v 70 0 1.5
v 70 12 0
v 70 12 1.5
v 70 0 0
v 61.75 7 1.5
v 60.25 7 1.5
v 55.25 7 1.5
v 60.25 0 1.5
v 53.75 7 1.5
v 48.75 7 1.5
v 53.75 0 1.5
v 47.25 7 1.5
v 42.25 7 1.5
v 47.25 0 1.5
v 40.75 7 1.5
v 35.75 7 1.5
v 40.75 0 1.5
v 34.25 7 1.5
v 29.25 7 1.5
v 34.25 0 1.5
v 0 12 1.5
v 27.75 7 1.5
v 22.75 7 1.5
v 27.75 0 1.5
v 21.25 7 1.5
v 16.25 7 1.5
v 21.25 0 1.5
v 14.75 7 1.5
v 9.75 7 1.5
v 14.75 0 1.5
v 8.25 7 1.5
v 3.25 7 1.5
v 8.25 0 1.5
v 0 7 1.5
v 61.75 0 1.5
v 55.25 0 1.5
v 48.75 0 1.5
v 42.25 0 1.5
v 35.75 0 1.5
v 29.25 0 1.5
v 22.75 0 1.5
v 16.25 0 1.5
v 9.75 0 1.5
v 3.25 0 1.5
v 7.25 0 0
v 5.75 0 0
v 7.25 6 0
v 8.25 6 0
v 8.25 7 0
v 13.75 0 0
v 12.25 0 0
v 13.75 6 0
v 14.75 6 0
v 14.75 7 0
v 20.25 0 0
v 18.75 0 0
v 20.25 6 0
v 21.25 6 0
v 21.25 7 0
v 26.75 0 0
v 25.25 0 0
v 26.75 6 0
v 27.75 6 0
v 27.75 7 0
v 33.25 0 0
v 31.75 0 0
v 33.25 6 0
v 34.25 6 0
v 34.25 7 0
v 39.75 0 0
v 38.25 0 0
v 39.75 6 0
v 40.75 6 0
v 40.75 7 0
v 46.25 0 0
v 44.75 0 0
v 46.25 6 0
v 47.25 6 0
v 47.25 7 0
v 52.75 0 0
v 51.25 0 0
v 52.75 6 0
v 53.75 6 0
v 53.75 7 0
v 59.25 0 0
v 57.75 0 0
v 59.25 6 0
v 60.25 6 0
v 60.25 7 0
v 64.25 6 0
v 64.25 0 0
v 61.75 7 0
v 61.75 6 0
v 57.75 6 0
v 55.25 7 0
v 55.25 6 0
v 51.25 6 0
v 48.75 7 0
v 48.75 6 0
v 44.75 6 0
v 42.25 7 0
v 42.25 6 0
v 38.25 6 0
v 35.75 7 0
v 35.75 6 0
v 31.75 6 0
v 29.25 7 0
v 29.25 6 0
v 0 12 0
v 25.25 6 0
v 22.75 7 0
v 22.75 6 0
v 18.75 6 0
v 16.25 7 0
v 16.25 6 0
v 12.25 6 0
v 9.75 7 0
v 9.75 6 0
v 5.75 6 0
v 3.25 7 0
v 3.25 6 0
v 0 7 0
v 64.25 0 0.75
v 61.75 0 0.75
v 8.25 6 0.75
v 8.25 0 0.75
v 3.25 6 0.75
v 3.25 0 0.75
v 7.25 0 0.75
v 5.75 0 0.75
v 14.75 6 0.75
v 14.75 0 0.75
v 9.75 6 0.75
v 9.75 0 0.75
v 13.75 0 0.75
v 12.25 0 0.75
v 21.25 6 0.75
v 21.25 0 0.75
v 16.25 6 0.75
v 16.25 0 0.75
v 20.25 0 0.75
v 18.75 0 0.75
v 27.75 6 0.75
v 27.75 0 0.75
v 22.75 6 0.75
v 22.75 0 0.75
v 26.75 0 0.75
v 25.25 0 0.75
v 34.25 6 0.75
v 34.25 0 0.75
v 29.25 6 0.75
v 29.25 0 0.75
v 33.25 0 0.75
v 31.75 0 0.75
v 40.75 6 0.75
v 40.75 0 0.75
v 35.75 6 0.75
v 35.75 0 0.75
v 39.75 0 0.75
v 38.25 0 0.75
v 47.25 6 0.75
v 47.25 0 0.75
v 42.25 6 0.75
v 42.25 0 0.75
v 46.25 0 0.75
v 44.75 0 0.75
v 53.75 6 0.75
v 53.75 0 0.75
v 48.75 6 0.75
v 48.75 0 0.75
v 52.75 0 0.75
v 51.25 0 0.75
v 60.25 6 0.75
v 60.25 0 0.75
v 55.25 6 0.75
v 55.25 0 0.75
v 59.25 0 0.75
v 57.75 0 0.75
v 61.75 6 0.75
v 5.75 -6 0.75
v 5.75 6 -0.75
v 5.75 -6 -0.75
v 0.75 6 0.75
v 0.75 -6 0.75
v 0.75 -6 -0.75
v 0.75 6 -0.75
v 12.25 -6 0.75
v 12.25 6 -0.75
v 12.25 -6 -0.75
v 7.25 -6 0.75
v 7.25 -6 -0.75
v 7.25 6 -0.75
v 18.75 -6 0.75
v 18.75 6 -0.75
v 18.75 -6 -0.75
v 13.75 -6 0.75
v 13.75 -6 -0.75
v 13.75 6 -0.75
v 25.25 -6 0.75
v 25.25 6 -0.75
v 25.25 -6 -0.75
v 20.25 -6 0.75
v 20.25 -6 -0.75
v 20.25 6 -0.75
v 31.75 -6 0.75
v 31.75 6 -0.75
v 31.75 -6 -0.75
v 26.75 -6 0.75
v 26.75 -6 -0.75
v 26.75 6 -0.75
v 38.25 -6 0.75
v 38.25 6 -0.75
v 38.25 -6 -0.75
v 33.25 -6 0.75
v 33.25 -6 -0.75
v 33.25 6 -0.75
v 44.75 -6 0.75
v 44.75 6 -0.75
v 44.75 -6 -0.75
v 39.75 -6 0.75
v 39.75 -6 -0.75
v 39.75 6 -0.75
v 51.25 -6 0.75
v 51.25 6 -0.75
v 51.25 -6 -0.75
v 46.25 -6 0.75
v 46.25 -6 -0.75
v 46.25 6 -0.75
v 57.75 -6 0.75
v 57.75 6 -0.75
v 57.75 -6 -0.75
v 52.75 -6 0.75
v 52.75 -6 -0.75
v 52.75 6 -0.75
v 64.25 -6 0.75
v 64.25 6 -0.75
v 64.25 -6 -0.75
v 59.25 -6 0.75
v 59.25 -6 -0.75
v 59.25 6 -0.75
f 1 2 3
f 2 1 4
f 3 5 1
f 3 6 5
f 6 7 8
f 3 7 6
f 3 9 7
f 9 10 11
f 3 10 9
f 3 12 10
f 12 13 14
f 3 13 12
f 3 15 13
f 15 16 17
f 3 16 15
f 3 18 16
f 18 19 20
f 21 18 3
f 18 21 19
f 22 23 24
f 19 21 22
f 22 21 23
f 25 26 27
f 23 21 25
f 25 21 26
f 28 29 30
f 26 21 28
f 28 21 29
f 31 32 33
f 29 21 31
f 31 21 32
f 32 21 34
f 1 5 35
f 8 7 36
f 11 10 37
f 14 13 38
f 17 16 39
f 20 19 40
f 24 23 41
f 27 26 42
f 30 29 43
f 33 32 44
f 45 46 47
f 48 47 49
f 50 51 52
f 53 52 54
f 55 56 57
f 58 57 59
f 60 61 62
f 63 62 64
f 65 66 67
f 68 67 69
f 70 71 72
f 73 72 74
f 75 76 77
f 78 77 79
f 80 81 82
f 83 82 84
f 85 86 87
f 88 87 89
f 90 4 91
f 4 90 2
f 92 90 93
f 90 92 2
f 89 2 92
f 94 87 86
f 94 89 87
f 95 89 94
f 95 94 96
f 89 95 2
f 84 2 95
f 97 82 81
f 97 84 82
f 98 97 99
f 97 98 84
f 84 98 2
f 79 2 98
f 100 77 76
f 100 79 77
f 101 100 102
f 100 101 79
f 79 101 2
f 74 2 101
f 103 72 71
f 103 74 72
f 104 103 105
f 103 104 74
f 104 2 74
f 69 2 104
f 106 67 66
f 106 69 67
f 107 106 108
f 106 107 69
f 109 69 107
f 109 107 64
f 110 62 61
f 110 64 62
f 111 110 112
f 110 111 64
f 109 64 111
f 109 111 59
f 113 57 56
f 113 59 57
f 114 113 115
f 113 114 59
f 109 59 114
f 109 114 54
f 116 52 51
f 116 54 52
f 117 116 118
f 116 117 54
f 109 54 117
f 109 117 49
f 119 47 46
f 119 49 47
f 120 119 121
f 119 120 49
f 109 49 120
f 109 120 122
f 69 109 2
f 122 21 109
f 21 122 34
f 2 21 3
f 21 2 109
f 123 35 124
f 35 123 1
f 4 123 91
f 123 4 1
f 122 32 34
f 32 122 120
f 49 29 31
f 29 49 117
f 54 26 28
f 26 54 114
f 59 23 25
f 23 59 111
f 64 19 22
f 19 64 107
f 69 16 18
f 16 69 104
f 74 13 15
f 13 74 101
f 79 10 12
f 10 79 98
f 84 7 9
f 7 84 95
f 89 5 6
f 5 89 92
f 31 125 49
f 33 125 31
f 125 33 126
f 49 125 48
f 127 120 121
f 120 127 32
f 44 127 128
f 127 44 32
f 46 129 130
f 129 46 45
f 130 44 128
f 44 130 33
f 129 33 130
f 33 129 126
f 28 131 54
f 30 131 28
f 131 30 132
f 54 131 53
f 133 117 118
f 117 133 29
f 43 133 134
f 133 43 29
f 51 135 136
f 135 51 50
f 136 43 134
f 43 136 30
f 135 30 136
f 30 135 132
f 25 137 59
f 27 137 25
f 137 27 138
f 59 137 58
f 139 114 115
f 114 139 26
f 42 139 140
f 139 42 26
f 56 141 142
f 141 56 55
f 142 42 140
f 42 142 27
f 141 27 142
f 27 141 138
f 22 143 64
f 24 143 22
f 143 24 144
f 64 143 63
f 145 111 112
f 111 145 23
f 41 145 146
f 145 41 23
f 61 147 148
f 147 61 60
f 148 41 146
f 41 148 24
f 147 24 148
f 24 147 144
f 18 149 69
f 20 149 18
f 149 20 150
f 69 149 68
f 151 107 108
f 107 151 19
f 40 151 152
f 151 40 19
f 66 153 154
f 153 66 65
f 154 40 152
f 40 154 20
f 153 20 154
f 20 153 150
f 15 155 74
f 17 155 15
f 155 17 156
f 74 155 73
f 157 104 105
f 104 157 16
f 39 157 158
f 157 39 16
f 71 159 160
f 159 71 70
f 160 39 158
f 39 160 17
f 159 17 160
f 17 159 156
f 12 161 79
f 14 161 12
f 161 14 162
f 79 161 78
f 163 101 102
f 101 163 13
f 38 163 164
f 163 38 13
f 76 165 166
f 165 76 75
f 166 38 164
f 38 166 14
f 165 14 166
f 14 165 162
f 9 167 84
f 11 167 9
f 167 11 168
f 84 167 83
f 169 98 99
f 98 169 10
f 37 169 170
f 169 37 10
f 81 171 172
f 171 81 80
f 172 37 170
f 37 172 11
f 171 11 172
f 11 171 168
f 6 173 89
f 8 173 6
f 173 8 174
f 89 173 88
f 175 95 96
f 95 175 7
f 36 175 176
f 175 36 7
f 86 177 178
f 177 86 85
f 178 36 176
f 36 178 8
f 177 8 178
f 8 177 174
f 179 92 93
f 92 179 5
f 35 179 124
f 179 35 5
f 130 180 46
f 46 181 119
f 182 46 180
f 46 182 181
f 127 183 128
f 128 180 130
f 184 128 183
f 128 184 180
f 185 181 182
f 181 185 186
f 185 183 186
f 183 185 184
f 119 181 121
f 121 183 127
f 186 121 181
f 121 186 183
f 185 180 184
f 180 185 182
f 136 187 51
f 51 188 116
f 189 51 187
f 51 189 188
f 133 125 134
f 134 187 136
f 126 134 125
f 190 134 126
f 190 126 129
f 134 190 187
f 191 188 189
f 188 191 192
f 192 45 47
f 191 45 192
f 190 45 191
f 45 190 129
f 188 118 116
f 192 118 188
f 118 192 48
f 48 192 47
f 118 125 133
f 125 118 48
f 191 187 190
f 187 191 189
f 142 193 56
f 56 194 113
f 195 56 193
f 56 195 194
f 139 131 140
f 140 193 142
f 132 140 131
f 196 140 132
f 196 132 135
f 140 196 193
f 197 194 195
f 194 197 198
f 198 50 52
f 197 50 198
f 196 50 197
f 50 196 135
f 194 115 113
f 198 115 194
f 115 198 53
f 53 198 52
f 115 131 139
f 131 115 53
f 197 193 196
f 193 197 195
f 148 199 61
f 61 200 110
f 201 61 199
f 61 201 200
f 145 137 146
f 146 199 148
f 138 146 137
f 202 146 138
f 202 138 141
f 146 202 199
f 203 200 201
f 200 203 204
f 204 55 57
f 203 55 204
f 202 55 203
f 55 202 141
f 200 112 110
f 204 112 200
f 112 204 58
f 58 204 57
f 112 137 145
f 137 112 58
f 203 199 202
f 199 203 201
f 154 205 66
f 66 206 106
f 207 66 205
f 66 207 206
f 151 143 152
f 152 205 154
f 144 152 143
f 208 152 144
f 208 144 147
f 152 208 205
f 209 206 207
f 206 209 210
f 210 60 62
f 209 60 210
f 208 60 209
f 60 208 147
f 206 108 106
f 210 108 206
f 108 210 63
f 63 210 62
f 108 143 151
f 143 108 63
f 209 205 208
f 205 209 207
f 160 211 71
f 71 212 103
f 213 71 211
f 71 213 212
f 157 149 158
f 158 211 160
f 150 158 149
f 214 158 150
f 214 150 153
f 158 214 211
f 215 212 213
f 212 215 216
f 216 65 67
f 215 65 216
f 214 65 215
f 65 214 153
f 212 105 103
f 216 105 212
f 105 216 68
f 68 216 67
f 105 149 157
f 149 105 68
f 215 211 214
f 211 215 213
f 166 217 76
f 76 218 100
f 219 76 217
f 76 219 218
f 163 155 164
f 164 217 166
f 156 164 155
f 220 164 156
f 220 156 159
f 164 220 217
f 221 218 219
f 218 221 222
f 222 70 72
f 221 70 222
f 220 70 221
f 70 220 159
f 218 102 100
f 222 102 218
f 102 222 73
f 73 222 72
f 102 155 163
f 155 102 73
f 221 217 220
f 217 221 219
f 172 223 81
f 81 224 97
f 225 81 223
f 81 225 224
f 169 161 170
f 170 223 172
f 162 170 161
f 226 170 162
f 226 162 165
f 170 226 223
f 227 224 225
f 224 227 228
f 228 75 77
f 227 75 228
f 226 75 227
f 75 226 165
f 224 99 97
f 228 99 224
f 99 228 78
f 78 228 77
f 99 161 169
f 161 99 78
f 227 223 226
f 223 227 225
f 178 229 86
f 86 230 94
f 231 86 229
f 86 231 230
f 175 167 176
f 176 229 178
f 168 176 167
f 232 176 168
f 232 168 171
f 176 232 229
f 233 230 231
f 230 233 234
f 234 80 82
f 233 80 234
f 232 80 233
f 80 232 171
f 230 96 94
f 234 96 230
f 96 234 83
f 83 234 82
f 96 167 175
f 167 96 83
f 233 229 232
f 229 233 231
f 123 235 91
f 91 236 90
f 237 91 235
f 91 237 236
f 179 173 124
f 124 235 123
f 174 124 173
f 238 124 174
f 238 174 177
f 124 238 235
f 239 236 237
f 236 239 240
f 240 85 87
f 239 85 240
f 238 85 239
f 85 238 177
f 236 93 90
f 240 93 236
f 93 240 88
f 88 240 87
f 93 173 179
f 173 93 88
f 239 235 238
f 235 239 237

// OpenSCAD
// 10-well Agarose Gel Comb
// Designed for FDM printing, lying flat on the XY plane (Z=0).
// Dimensions in millimetres.

// --- Dimensions ---
$fn = 100; // High resolution for smooth edges

// Spine dimensions
SPINE_LENGTH = 70;  // X
SPINE_WIDTH = 12;   // Y
PLATE_THICKNESS = 1.5; // Z

// Tooth dimensions
TOOTH_WIDTH = 5.0;  // X
TOOTH_LENGTH = 12;  // Y (extends from spine edge)
NUM_TEETH = 10;
GAP_SIZE = 1.5;     // Gap between teeth

// --- Calculations ---
// Total width of the tooth row
TOOTH_ROW_WIDTH = (NUM_TEETH * TOOTH_WIDTH) + ((NUM_TEETH - 1) * GAP_SIZE);

// Offset to center the tooth row on the spine in X
X_OFFSET = (SPINE_LENGTH - TOOTH_ROW_WIDTH) / 2;

// Position of the spine edge where teeth hang (in -Y direction)
// Spine goes from -SPINE_WIDTH/2 to +SPINE_WIDTH/2.
// Teeth hang from the edge at -SPINE_WIDTH/2.
SPINE_EDGE_Y = -SPINE_WIDTH / 2;

// --- Main Body (Spine) ---
// Create the flat plate spine
difference() {
    // Outer block
    cube([SPINE_LENGTH, SPINE_WIDTH, PLATE_THICKNESS], center = false);
    
    // Cut out the area where teeth will hang to ensure clean separation
    // We cut a rectangle slightly larger than the total tooth row width
    // to ensure no material bridges the teeth.
    translate([0, SPINE_EDGE_Y - 1, 0]) {
        cube([TOOTH_ROW_WIDTH + 2, TOOTH_LENGTH + 2, PLATE_THICKNESS]);
    }
}

// --- Teeth ---
// Loop to create each tooth
for (i = [0 : NUM_TEETH - 1]) {
    // Calculate X position for this tooth
    // Start at X_OFFSET, add tooth width and gap for each previous tooth
    tooth_x = X_OFFSET + (i * (TOOTH_WIDTH + GAP_SIZE));
    
    // Calculate Y position for this tooth
    // Centered on the spine edge in Y
    tooth_y = SPINE_EDGE_Y + (TOOTH_LENGTH / 2);
    
    translate([tooth_x, tooth_y, 0]) {
        // Tooth geometry: Width x Length x Thickness
        // Note: The tooth hangs down from the spine edge.
        // The spine edge is at Y = SPINE_EDGE_Y.
        // The tooth extends from SPINE_EDGE_Y to SPINE_EDGE_Y - TOOTH_LENGTH.
        // However, the previous difference() cut already removed the spine material 
        // in that region. We just need to print the tooth shape.
        
        // To make it a solid tooth, we extrude the rectangle.
        // The tooth sits on the bed (Z=0) and goes up to PLATE_THICKNESS.
        // It hangs from the spine edge.
        
        // Define the tooth box relative to its center
        // X: tooth_x is center. Width = TOOTH_WIDTH.
        // Y: tooth_y is center. Length = TOOTH_LENGTH.
        // Z: 0 to PLATE_THICKNESS.
        
        cube([TOOTH_WIDTH, TOOTH_LENGTH, PLATE_THICKNESS], center = false);
        
        // Adjust position to match the calculated center
        // The cube command above uses center=false, so we need to translate to the corner or center?
        // Let's use center=true for the cube command to simplify translation logic.
    }
}

// Re-do the teeth loop with correct centering logic for the cube command
for (i = [0 : NUM_TEETH - 1]) {
    tooth_x = X_OFFSET + (i * (TOOTH_WIDTH + GAP_SIZE));
    tooth_y = SPINE_EDGE_Y + (TOOTH_LENGTH / 2);
    
    translate([tooth_x, tooth_y, 0]) {
        cube([TOOTH_WIDTH, TOOTH_LENGTH, PLATE_THICKNESS], center = true);
    }
}
